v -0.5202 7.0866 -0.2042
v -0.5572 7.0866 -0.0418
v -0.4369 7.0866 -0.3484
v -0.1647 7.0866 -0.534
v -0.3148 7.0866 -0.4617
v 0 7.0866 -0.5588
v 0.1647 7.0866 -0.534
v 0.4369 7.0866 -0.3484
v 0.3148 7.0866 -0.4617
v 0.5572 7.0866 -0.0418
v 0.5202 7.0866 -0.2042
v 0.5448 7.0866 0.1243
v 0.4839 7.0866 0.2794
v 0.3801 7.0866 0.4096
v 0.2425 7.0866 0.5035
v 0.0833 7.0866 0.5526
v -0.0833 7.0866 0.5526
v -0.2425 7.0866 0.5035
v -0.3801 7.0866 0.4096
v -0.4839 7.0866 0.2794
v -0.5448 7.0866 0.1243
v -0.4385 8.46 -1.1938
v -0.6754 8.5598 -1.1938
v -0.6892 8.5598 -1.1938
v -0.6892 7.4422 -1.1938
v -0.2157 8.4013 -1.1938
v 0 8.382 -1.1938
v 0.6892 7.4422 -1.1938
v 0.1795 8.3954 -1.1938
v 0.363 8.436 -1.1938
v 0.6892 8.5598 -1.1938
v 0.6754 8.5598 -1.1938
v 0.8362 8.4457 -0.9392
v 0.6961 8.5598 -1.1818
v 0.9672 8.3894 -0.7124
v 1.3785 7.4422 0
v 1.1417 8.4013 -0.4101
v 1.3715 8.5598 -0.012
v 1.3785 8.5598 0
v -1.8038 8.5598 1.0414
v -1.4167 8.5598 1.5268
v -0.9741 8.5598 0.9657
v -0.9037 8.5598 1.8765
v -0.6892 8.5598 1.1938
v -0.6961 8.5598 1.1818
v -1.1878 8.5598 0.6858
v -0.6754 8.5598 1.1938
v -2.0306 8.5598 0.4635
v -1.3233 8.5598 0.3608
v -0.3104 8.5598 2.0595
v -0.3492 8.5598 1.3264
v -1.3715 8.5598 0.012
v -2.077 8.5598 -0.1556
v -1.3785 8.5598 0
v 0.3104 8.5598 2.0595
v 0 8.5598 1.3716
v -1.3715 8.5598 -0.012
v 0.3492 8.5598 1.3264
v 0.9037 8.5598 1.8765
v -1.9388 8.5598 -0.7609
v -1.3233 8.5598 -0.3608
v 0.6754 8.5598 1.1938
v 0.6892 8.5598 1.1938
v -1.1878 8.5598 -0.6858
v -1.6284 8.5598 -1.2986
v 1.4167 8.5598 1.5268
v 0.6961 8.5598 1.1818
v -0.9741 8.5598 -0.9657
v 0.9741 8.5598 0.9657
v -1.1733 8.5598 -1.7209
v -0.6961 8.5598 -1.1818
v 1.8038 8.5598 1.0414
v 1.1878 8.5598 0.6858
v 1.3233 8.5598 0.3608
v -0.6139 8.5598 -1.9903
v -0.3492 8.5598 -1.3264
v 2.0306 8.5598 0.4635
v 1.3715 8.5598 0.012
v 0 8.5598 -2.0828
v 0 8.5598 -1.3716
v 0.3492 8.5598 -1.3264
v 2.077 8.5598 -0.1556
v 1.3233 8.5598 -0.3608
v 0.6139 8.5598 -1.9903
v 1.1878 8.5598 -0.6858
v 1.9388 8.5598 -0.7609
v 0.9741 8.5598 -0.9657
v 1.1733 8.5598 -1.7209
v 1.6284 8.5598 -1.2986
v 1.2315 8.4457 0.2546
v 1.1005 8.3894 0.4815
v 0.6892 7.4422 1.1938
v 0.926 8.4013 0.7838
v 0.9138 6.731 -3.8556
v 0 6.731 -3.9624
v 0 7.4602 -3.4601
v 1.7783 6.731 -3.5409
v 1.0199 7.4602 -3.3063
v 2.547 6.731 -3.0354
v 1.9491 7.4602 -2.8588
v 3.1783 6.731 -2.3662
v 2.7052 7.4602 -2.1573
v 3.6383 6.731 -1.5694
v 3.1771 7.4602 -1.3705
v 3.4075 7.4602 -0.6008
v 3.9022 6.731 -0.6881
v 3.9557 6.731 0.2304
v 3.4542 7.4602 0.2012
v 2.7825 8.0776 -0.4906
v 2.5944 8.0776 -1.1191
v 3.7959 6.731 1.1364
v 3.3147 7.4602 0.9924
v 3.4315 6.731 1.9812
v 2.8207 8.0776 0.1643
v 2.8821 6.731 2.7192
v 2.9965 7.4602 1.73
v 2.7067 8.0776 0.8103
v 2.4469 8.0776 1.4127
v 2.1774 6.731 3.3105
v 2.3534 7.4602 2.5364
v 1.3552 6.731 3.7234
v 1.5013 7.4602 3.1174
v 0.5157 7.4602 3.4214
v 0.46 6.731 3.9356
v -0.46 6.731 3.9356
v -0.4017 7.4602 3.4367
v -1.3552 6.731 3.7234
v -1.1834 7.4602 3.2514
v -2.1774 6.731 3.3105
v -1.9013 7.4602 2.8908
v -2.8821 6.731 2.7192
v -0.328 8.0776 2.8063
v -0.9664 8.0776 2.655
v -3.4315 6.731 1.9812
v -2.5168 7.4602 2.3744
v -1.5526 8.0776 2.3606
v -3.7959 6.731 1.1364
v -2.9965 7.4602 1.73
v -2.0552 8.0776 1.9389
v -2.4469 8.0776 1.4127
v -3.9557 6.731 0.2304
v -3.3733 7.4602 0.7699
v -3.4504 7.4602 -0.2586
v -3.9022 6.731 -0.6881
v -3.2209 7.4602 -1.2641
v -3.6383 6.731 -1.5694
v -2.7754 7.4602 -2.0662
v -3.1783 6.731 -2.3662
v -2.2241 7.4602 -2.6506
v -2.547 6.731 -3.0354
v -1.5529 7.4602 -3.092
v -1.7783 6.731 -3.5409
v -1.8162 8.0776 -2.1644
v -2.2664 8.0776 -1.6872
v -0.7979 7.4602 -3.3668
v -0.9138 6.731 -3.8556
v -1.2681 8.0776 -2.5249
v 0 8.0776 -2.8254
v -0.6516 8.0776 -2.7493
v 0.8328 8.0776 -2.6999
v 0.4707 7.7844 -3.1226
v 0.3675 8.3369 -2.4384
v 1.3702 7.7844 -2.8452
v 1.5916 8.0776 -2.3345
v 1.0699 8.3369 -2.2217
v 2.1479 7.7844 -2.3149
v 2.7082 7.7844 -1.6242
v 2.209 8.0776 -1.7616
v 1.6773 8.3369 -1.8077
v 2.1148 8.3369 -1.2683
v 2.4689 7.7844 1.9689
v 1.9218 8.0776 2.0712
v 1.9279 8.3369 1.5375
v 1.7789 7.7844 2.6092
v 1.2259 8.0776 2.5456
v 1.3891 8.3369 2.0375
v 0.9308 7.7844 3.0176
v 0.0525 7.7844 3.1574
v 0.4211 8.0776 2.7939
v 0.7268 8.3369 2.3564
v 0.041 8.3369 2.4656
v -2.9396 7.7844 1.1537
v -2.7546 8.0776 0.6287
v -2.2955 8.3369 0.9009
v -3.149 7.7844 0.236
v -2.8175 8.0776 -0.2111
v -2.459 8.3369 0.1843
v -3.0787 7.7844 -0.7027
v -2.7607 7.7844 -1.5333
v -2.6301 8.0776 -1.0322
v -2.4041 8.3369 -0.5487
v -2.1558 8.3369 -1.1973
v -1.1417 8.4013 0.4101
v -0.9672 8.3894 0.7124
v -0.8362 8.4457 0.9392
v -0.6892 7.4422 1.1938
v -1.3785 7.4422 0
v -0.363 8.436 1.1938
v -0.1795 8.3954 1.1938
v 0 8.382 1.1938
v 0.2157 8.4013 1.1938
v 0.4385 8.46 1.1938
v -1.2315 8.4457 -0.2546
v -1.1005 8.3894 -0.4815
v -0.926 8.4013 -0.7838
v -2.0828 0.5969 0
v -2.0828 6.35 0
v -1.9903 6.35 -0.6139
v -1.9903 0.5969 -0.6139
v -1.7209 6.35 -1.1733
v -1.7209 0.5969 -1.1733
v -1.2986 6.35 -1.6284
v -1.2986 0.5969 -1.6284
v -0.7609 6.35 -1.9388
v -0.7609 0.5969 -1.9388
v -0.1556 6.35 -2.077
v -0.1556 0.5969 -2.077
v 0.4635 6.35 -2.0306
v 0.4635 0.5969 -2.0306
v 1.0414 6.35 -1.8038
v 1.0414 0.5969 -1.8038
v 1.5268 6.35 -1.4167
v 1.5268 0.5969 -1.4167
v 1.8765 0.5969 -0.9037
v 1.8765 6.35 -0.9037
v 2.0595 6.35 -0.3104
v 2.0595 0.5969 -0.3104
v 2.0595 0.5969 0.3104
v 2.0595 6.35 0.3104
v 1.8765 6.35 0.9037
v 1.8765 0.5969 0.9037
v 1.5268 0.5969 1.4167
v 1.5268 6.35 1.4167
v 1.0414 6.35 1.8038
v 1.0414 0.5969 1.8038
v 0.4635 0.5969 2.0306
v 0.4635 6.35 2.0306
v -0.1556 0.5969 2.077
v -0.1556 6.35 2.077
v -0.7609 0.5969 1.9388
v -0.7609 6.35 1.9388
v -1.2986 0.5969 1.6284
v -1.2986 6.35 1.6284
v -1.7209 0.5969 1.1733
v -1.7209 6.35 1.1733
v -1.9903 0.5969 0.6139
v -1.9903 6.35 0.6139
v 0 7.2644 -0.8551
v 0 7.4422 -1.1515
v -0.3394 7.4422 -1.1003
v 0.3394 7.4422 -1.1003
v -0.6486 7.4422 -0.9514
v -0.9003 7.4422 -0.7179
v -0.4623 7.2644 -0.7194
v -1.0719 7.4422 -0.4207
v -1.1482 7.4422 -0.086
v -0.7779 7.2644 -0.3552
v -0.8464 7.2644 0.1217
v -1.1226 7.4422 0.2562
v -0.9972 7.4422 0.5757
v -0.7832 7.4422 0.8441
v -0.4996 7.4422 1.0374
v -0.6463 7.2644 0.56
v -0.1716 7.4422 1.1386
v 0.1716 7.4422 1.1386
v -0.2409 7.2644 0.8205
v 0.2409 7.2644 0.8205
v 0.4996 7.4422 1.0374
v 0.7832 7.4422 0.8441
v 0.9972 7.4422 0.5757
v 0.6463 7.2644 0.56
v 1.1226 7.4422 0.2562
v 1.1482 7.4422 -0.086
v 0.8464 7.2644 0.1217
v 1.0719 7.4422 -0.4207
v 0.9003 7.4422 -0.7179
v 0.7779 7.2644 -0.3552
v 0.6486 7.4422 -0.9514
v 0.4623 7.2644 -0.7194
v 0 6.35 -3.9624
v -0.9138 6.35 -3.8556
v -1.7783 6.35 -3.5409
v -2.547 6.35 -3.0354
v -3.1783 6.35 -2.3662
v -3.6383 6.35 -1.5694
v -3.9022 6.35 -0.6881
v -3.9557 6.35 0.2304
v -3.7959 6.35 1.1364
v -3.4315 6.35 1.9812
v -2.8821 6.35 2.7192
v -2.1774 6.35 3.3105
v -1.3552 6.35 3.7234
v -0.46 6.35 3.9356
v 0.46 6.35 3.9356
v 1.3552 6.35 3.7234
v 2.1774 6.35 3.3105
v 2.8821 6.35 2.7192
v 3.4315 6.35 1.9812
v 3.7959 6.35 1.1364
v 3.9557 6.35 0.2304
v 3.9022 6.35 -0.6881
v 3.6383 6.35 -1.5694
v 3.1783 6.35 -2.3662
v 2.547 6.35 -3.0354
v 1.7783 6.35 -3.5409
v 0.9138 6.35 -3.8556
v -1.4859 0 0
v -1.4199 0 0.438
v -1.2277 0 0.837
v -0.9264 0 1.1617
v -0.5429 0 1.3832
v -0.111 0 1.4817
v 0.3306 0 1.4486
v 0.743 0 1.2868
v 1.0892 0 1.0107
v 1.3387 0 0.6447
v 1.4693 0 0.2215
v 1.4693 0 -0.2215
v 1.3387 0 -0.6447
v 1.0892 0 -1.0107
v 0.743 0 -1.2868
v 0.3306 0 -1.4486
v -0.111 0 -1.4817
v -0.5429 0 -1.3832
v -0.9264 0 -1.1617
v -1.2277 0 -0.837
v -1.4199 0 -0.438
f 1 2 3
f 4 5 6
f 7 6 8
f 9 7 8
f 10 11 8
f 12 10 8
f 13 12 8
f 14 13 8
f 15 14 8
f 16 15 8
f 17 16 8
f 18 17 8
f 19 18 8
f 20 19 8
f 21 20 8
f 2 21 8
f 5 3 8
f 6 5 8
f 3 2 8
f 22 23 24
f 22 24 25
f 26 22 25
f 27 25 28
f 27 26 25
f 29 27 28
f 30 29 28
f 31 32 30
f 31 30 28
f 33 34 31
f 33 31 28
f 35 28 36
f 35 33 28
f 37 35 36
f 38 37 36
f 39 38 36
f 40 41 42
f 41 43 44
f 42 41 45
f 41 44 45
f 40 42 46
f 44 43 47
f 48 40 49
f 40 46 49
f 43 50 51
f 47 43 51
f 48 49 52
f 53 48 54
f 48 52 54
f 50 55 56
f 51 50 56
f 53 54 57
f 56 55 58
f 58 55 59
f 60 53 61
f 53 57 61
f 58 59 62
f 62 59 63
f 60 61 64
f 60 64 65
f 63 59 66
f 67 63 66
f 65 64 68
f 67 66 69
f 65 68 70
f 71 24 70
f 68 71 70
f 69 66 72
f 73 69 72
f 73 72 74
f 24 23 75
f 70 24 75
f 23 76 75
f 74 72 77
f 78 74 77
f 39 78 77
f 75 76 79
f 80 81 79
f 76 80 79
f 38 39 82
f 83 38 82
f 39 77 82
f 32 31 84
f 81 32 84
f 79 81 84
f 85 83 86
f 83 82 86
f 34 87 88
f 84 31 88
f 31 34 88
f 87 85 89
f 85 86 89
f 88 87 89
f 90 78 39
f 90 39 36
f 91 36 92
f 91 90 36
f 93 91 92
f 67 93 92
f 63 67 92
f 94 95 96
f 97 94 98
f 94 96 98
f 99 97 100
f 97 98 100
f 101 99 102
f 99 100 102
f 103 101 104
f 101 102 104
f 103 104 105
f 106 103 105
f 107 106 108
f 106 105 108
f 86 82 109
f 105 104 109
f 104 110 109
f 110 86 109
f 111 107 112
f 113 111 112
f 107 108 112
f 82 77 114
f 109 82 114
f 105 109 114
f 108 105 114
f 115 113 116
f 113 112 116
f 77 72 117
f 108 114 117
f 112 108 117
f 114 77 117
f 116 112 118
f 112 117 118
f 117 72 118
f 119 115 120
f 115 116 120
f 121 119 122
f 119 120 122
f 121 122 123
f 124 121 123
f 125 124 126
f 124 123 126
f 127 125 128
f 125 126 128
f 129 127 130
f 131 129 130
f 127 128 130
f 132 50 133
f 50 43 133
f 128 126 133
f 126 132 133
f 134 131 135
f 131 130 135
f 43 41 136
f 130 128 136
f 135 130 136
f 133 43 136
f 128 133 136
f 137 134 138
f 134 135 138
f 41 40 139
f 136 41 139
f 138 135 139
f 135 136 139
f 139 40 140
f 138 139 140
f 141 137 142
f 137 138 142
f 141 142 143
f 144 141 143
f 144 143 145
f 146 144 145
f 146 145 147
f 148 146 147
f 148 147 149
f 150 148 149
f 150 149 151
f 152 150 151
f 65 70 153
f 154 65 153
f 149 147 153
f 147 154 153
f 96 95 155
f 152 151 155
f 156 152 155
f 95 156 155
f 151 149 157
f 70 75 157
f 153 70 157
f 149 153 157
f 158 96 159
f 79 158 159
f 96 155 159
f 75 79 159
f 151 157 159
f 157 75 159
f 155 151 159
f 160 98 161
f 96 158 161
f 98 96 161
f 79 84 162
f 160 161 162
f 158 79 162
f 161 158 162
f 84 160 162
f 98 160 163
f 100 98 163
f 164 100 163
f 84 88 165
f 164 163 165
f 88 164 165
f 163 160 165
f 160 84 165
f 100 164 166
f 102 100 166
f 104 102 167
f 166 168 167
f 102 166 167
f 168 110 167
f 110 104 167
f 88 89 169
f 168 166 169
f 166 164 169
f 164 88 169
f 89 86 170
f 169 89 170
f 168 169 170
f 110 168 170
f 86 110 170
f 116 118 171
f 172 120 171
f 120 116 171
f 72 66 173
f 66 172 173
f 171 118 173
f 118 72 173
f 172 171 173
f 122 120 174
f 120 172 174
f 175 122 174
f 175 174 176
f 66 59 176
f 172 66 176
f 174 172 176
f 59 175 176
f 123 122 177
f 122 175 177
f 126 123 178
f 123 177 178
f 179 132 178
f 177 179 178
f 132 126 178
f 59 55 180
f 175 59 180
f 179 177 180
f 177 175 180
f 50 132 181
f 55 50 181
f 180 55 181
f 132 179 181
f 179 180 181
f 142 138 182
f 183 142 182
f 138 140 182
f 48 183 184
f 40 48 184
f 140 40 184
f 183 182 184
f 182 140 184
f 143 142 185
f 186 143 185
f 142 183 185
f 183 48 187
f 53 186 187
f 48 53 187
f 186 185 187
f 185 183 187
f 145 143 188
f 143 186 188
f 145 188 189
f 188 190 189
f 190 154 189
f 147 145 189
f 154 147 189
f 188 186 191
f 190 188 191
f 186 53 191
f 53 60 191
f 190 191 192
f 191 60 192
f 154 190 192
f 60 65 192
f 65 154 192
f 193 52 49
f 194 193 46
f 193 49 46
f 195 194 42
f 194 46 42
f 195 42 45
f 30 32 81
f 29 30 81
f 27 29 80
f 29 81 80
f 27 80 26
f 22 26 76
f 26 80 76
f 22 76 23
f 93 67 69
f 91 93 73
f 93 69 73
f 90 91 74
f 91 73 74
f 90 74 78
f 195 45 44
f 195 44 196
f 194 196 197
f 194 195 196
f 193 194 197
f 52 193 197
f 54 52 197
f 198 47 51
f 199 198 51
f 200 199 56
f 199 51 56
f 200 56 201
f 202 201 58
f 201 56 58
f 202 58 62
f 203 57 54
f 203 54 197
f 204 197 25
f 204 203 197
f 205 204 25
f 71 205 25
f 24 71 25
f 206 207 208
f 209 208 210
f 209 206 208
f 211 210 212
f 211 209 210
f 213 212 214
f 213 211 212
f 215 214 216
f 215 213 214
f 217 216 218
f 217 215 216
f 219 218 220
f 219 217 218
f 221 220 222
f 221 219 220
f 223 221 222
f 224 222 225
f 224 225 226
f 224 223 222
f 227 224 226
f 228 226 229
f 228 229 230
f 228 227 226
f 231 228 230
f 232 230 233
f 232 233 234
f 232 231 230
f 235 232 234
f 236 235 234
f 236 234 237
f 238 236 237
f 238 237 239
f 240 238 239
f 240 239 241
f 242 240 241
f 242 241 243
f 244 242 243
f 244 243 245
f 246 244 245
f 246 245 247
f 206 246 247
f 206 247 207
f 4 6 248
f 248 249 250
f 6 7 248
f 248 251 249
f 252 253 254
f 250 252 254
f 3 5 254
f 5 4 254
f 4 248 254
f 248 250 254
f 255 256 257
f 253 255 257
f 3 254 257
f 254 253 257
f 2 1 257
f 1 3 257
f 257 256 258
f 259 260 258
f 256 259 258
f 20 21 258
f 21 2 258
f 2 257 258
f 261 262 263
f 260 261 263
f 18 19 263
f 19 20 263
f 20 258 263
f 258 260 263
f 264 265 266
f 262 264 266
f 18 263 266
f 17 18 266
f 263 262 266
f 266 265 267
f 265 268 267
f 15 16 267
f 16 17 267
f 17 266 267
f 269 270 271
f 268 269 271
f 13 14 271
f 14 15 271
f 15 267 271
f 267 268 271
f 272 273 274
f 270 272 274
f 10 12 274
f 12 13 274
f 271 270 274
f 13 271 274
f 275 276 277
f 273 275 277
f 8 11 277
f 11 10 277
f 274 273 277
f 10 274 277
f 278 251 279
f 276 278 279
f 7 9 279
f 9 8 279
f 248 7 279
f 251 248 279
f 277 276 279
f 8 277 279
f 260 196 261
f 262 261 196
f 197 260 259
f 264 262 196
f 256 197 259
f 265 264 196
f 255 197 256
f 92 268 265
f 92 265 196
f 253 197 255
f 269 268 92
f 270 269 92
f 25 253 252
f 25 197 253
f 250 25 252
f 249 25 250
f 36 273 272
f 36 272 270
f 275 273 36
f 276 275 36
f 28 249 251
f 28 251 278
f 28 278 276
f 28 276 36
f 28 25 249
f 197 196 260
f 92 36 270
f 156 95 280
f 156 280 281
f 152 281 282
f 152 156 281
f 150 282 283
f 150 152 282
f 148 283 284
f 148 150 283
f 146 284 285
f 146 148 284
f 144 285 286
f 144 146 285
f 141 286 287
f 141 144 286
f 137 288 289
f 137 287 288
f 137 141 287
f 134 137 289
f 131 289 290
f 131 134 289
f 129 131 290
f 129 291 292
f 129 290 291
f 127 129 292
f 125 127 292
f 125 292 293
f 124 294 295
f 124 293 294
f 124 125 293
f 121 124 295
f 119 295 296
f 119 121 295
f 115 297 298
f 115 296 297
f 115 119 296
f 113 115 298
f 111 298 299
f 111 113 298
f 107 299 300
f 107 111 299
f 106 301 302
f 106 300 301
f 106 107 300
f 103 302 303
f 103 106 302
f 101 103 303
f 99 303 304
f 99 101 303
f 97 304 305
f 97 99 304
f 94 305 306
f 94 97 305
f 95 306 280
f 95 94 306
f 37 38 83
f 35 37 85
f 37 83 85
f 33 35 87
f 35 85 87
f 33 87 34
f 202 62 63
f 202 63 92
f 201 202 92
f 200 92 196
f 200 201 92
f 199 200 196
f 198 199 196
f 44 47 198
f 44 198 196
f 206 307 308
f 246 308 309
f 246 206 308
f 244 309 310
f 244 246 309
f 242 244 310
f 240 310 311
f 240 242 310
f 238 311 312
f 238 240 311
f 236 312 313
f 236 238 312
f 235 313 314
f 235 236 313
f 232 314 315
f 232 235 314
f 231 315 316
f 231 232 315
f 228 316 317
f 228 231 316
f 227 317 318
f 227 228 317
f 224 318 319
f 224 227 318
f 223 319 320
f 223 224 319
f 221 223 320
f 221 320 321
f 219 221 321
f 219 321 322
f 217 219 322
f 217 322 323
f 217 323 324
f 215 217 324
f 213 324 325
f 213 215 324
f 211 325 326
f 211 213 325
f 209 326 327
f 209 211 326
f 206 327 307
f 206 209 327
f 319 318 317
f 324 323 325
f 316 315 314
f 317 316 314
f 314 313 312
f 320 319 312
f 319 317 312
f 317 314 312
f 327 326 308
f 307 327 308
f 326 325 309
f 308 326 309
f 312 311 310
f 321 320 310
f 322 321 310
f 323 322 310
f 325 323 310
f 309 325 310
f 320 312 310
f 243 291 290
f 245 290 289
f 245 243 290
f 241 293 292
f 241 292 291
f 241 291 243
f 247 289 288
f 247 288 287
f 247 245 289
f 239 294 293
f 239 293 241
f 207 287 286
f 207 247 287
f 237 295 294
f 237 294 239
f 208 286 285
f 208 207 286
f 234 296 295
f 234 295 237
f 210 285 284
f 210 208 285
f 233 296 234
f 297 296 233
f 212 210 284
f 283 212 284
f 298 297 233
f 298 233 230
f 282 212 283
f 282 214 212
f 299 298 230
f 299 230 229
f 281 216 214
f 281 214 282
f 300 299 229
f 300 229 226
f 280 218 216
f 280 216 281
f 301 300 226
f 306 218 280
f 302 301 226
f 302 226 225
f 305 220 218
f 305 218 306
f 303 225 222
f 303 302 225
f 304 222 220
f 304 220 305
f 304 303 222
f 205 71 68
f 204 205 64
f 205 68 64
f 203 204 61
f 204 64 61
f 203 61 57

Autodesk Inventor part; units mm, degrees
ref_plane "YZ Plane" through (0, 0, 0) normal (1, 0, 0) x (0, 1, 0)
ref_plane "XZ Plane" through (0, 0, 0) normal (0, 1, 0) x (-1, 0, 0)
ref_plane "XY Plane" through (0, 0, 0) normal (0, 0, 1) x (1, 0, 0)
sketch "Sketch1" plane through (0, 0, 0) normal (0, 1, 0) x (-1, 0, 0)
  circle A0 centre (0, 0) radius 2.0828
  dimension "d4" = 4.1656
extrude "Body" add sketch "Sketch1" along normal blind 6.35
sketch "Sketch2" plane through (0, 0, 0) normal (1, 0, 0) x (0, 1, 0)
  line L0 (6.35, -2.0828) -> (6.35, 2.0828) projected
  line L1 (6.35, 0) -> (6.35, -3.9624)
  line L2 (6.35, -3.9624) -> (6.731, -3.9624)
  arc A0 (6.731, -3.9624) -> (8.5598, -2.0828) centre (4.5388, 0) ccw
  line L3 (8.5598, -2.0828) -> (8.5598, -1.1938)
  line L4 (8.5598, -1.1938) -> (7.4676, -1.1938)
  line L5 (7.4676, -1.1938) -> (7.0866, -0.5588)
  line L6 (7.0866, -0.5588) -> (7.0866, 0)
  line L7 (7.0866, 0) -> (6.35, 0)
  point P0 (0, 0)
  dimension "d5" = 3.9624
  dimension "d6" = 0.381
  dimension "d13" = 0.7366
  dimension "d14" = 2.0828
  dimension "d15" = 2.2098
  dimension "d16" = 0
  dimension "d17" = 1.1938
  dimension "d18" = 0.5588
  dimension "d19" = 0.381
revolve "Head" add sketch "Sketch2" angle 360 about axis through (0, 7.0866, 0) along (0, -1, 0)
sketch "Sketch3" plane through (0, 8.5598, 0) normal (0, 1, 0) x (1, 0, 0)
  line L0 (0.6892, 1.1938) -> (1.3785, 0)
  line L1 (1.3785, 0) -> (0.6892, -1.1938)
  line L2 (0.6892, -1.1938) -> (-0.6892, -1.1938)
  line L3 (-0.6892, -1.1938) -> (-1.3785, 0)
  line L4 (-1.3785, 0) -> (-0.6892, 1.1938)
  line L5 (-0.6892, 1.1938) -> (0.6892, 1.1938)
  circle A0 centre (0, 0) radius 1.1938 projected
  point P0 (0, 0)
  point P1 (0, 0)
extrude "Hex" cut sketch "Sketch3" against normal blind 1.1176
sketch "Sketch4" plane through (0, 0, 0) normal (0, 0, 1) x (1, 0, 0)
  line L0 (-0.6892, 7.4422) -> (0.6892, 7.4422) projected
  line L1 (-0.6892, 8.5598) -> (0.6892, 8.5598) projected
  line L2 (-0.254, 7.4422) -> (-1.3716, 8.5598)
  line L3 (-1.3785, 8.5598) -> (-1.3785, 7.4422) projected
  line L4 (-1.3785, 8.5598) -> (-0.254, 8.5598)
  line L5 (-0.254, 8.5598) -> (-0.254, 7.4422)
  line L6 (0, -4.252) -> (0, 25.5118) projected
  point P0 (0, 0)
  point P1 (0, 8.5598)
  point P2 (-0.254, 8.5598)
  dimension "d28" = 45
  dimension "d29" = 1.3716
revolve "Head Chamfer" cut sketch "Sketch4" angle 360 about axis through (0, -10, 0) along (0, 1, 0) contours L2 L4 L1 L5
sketch "Sketch5" plane through (0, 0, 0) normal (1, 0, 0) x (0, 1, 0)
  line L0 (0, -2.0828) -> (6.35, -2.0828) projected
  line L1 (6.35, 3.9624) -> (6.35, -3.9624) projected
  line L2 (6.35, -2.0828) -> (6.35, 2.0828) projected
  line L3 (0.0745, -2.0828) -> (-0.2261, -2.6035)
  line L4 (-0.2261, -2.6035) -> (-0.3253, -2.6035)
  line L5 (-0.3253, -2.6035) -> (-0.626, -2.0828)
  line L6 (0.0686, -2.6035) -> (-0.7252, -2.6035) construction
  line L7 (-0.626, -2.0828) -> (0.0745, -2.0828)
  line L8 (0, -2.0828) -> (6.35, -2.0828) projected
  point P0 (0, 0)
  dimension "d31" = 30
  dimension "d32" = 60
  dimension "a" = 0.0992
  dimension "d46" = 0.7937
  dimension "d54" = 0.0686
  dimension "d55" = 0.5207
  dimension "d56" = 0.0992
feature "Thread" [suppressed]
sketch "Sketch6" plane through (0, 0, 0) normal (0, 0, 1) x (1, 0, 0)
  line L0 (0, 0) -> (-1.4859, 0)
  line L1 (2.0828, 0) -> (-2.0828, 0) projected
  line L2 (-1.4859, 0) -> (-2.4948, 1.0089)
  line L3 (-2.4948, 1.0089) -> (-2.9651, -1.2188)
  line L4 (-2.9651, -1.2188) -> (-1.4859, -1.2188)
  line L5 (-2.0828, 0) -> (-2.0828, 6.35) projected
  line L6 (-1.4859, -1.2188) -> (-1.4859, 0)
  line L7 (0, -5.1871) -> (0, 22.5907) projected
  point P0 (-2.0828, 0.5969)
  dimension "d49" = 1.4859
  dimension "d50" = 135
revolve "Tapered End" cut sketch "Sketch6" angle 360 about axis through (0, -10, 0) along (0, 1, 0)
equation "\"d56\" = a"
properties part number "Screw 8-32 Steel 2.500" material "VEX Steel"
